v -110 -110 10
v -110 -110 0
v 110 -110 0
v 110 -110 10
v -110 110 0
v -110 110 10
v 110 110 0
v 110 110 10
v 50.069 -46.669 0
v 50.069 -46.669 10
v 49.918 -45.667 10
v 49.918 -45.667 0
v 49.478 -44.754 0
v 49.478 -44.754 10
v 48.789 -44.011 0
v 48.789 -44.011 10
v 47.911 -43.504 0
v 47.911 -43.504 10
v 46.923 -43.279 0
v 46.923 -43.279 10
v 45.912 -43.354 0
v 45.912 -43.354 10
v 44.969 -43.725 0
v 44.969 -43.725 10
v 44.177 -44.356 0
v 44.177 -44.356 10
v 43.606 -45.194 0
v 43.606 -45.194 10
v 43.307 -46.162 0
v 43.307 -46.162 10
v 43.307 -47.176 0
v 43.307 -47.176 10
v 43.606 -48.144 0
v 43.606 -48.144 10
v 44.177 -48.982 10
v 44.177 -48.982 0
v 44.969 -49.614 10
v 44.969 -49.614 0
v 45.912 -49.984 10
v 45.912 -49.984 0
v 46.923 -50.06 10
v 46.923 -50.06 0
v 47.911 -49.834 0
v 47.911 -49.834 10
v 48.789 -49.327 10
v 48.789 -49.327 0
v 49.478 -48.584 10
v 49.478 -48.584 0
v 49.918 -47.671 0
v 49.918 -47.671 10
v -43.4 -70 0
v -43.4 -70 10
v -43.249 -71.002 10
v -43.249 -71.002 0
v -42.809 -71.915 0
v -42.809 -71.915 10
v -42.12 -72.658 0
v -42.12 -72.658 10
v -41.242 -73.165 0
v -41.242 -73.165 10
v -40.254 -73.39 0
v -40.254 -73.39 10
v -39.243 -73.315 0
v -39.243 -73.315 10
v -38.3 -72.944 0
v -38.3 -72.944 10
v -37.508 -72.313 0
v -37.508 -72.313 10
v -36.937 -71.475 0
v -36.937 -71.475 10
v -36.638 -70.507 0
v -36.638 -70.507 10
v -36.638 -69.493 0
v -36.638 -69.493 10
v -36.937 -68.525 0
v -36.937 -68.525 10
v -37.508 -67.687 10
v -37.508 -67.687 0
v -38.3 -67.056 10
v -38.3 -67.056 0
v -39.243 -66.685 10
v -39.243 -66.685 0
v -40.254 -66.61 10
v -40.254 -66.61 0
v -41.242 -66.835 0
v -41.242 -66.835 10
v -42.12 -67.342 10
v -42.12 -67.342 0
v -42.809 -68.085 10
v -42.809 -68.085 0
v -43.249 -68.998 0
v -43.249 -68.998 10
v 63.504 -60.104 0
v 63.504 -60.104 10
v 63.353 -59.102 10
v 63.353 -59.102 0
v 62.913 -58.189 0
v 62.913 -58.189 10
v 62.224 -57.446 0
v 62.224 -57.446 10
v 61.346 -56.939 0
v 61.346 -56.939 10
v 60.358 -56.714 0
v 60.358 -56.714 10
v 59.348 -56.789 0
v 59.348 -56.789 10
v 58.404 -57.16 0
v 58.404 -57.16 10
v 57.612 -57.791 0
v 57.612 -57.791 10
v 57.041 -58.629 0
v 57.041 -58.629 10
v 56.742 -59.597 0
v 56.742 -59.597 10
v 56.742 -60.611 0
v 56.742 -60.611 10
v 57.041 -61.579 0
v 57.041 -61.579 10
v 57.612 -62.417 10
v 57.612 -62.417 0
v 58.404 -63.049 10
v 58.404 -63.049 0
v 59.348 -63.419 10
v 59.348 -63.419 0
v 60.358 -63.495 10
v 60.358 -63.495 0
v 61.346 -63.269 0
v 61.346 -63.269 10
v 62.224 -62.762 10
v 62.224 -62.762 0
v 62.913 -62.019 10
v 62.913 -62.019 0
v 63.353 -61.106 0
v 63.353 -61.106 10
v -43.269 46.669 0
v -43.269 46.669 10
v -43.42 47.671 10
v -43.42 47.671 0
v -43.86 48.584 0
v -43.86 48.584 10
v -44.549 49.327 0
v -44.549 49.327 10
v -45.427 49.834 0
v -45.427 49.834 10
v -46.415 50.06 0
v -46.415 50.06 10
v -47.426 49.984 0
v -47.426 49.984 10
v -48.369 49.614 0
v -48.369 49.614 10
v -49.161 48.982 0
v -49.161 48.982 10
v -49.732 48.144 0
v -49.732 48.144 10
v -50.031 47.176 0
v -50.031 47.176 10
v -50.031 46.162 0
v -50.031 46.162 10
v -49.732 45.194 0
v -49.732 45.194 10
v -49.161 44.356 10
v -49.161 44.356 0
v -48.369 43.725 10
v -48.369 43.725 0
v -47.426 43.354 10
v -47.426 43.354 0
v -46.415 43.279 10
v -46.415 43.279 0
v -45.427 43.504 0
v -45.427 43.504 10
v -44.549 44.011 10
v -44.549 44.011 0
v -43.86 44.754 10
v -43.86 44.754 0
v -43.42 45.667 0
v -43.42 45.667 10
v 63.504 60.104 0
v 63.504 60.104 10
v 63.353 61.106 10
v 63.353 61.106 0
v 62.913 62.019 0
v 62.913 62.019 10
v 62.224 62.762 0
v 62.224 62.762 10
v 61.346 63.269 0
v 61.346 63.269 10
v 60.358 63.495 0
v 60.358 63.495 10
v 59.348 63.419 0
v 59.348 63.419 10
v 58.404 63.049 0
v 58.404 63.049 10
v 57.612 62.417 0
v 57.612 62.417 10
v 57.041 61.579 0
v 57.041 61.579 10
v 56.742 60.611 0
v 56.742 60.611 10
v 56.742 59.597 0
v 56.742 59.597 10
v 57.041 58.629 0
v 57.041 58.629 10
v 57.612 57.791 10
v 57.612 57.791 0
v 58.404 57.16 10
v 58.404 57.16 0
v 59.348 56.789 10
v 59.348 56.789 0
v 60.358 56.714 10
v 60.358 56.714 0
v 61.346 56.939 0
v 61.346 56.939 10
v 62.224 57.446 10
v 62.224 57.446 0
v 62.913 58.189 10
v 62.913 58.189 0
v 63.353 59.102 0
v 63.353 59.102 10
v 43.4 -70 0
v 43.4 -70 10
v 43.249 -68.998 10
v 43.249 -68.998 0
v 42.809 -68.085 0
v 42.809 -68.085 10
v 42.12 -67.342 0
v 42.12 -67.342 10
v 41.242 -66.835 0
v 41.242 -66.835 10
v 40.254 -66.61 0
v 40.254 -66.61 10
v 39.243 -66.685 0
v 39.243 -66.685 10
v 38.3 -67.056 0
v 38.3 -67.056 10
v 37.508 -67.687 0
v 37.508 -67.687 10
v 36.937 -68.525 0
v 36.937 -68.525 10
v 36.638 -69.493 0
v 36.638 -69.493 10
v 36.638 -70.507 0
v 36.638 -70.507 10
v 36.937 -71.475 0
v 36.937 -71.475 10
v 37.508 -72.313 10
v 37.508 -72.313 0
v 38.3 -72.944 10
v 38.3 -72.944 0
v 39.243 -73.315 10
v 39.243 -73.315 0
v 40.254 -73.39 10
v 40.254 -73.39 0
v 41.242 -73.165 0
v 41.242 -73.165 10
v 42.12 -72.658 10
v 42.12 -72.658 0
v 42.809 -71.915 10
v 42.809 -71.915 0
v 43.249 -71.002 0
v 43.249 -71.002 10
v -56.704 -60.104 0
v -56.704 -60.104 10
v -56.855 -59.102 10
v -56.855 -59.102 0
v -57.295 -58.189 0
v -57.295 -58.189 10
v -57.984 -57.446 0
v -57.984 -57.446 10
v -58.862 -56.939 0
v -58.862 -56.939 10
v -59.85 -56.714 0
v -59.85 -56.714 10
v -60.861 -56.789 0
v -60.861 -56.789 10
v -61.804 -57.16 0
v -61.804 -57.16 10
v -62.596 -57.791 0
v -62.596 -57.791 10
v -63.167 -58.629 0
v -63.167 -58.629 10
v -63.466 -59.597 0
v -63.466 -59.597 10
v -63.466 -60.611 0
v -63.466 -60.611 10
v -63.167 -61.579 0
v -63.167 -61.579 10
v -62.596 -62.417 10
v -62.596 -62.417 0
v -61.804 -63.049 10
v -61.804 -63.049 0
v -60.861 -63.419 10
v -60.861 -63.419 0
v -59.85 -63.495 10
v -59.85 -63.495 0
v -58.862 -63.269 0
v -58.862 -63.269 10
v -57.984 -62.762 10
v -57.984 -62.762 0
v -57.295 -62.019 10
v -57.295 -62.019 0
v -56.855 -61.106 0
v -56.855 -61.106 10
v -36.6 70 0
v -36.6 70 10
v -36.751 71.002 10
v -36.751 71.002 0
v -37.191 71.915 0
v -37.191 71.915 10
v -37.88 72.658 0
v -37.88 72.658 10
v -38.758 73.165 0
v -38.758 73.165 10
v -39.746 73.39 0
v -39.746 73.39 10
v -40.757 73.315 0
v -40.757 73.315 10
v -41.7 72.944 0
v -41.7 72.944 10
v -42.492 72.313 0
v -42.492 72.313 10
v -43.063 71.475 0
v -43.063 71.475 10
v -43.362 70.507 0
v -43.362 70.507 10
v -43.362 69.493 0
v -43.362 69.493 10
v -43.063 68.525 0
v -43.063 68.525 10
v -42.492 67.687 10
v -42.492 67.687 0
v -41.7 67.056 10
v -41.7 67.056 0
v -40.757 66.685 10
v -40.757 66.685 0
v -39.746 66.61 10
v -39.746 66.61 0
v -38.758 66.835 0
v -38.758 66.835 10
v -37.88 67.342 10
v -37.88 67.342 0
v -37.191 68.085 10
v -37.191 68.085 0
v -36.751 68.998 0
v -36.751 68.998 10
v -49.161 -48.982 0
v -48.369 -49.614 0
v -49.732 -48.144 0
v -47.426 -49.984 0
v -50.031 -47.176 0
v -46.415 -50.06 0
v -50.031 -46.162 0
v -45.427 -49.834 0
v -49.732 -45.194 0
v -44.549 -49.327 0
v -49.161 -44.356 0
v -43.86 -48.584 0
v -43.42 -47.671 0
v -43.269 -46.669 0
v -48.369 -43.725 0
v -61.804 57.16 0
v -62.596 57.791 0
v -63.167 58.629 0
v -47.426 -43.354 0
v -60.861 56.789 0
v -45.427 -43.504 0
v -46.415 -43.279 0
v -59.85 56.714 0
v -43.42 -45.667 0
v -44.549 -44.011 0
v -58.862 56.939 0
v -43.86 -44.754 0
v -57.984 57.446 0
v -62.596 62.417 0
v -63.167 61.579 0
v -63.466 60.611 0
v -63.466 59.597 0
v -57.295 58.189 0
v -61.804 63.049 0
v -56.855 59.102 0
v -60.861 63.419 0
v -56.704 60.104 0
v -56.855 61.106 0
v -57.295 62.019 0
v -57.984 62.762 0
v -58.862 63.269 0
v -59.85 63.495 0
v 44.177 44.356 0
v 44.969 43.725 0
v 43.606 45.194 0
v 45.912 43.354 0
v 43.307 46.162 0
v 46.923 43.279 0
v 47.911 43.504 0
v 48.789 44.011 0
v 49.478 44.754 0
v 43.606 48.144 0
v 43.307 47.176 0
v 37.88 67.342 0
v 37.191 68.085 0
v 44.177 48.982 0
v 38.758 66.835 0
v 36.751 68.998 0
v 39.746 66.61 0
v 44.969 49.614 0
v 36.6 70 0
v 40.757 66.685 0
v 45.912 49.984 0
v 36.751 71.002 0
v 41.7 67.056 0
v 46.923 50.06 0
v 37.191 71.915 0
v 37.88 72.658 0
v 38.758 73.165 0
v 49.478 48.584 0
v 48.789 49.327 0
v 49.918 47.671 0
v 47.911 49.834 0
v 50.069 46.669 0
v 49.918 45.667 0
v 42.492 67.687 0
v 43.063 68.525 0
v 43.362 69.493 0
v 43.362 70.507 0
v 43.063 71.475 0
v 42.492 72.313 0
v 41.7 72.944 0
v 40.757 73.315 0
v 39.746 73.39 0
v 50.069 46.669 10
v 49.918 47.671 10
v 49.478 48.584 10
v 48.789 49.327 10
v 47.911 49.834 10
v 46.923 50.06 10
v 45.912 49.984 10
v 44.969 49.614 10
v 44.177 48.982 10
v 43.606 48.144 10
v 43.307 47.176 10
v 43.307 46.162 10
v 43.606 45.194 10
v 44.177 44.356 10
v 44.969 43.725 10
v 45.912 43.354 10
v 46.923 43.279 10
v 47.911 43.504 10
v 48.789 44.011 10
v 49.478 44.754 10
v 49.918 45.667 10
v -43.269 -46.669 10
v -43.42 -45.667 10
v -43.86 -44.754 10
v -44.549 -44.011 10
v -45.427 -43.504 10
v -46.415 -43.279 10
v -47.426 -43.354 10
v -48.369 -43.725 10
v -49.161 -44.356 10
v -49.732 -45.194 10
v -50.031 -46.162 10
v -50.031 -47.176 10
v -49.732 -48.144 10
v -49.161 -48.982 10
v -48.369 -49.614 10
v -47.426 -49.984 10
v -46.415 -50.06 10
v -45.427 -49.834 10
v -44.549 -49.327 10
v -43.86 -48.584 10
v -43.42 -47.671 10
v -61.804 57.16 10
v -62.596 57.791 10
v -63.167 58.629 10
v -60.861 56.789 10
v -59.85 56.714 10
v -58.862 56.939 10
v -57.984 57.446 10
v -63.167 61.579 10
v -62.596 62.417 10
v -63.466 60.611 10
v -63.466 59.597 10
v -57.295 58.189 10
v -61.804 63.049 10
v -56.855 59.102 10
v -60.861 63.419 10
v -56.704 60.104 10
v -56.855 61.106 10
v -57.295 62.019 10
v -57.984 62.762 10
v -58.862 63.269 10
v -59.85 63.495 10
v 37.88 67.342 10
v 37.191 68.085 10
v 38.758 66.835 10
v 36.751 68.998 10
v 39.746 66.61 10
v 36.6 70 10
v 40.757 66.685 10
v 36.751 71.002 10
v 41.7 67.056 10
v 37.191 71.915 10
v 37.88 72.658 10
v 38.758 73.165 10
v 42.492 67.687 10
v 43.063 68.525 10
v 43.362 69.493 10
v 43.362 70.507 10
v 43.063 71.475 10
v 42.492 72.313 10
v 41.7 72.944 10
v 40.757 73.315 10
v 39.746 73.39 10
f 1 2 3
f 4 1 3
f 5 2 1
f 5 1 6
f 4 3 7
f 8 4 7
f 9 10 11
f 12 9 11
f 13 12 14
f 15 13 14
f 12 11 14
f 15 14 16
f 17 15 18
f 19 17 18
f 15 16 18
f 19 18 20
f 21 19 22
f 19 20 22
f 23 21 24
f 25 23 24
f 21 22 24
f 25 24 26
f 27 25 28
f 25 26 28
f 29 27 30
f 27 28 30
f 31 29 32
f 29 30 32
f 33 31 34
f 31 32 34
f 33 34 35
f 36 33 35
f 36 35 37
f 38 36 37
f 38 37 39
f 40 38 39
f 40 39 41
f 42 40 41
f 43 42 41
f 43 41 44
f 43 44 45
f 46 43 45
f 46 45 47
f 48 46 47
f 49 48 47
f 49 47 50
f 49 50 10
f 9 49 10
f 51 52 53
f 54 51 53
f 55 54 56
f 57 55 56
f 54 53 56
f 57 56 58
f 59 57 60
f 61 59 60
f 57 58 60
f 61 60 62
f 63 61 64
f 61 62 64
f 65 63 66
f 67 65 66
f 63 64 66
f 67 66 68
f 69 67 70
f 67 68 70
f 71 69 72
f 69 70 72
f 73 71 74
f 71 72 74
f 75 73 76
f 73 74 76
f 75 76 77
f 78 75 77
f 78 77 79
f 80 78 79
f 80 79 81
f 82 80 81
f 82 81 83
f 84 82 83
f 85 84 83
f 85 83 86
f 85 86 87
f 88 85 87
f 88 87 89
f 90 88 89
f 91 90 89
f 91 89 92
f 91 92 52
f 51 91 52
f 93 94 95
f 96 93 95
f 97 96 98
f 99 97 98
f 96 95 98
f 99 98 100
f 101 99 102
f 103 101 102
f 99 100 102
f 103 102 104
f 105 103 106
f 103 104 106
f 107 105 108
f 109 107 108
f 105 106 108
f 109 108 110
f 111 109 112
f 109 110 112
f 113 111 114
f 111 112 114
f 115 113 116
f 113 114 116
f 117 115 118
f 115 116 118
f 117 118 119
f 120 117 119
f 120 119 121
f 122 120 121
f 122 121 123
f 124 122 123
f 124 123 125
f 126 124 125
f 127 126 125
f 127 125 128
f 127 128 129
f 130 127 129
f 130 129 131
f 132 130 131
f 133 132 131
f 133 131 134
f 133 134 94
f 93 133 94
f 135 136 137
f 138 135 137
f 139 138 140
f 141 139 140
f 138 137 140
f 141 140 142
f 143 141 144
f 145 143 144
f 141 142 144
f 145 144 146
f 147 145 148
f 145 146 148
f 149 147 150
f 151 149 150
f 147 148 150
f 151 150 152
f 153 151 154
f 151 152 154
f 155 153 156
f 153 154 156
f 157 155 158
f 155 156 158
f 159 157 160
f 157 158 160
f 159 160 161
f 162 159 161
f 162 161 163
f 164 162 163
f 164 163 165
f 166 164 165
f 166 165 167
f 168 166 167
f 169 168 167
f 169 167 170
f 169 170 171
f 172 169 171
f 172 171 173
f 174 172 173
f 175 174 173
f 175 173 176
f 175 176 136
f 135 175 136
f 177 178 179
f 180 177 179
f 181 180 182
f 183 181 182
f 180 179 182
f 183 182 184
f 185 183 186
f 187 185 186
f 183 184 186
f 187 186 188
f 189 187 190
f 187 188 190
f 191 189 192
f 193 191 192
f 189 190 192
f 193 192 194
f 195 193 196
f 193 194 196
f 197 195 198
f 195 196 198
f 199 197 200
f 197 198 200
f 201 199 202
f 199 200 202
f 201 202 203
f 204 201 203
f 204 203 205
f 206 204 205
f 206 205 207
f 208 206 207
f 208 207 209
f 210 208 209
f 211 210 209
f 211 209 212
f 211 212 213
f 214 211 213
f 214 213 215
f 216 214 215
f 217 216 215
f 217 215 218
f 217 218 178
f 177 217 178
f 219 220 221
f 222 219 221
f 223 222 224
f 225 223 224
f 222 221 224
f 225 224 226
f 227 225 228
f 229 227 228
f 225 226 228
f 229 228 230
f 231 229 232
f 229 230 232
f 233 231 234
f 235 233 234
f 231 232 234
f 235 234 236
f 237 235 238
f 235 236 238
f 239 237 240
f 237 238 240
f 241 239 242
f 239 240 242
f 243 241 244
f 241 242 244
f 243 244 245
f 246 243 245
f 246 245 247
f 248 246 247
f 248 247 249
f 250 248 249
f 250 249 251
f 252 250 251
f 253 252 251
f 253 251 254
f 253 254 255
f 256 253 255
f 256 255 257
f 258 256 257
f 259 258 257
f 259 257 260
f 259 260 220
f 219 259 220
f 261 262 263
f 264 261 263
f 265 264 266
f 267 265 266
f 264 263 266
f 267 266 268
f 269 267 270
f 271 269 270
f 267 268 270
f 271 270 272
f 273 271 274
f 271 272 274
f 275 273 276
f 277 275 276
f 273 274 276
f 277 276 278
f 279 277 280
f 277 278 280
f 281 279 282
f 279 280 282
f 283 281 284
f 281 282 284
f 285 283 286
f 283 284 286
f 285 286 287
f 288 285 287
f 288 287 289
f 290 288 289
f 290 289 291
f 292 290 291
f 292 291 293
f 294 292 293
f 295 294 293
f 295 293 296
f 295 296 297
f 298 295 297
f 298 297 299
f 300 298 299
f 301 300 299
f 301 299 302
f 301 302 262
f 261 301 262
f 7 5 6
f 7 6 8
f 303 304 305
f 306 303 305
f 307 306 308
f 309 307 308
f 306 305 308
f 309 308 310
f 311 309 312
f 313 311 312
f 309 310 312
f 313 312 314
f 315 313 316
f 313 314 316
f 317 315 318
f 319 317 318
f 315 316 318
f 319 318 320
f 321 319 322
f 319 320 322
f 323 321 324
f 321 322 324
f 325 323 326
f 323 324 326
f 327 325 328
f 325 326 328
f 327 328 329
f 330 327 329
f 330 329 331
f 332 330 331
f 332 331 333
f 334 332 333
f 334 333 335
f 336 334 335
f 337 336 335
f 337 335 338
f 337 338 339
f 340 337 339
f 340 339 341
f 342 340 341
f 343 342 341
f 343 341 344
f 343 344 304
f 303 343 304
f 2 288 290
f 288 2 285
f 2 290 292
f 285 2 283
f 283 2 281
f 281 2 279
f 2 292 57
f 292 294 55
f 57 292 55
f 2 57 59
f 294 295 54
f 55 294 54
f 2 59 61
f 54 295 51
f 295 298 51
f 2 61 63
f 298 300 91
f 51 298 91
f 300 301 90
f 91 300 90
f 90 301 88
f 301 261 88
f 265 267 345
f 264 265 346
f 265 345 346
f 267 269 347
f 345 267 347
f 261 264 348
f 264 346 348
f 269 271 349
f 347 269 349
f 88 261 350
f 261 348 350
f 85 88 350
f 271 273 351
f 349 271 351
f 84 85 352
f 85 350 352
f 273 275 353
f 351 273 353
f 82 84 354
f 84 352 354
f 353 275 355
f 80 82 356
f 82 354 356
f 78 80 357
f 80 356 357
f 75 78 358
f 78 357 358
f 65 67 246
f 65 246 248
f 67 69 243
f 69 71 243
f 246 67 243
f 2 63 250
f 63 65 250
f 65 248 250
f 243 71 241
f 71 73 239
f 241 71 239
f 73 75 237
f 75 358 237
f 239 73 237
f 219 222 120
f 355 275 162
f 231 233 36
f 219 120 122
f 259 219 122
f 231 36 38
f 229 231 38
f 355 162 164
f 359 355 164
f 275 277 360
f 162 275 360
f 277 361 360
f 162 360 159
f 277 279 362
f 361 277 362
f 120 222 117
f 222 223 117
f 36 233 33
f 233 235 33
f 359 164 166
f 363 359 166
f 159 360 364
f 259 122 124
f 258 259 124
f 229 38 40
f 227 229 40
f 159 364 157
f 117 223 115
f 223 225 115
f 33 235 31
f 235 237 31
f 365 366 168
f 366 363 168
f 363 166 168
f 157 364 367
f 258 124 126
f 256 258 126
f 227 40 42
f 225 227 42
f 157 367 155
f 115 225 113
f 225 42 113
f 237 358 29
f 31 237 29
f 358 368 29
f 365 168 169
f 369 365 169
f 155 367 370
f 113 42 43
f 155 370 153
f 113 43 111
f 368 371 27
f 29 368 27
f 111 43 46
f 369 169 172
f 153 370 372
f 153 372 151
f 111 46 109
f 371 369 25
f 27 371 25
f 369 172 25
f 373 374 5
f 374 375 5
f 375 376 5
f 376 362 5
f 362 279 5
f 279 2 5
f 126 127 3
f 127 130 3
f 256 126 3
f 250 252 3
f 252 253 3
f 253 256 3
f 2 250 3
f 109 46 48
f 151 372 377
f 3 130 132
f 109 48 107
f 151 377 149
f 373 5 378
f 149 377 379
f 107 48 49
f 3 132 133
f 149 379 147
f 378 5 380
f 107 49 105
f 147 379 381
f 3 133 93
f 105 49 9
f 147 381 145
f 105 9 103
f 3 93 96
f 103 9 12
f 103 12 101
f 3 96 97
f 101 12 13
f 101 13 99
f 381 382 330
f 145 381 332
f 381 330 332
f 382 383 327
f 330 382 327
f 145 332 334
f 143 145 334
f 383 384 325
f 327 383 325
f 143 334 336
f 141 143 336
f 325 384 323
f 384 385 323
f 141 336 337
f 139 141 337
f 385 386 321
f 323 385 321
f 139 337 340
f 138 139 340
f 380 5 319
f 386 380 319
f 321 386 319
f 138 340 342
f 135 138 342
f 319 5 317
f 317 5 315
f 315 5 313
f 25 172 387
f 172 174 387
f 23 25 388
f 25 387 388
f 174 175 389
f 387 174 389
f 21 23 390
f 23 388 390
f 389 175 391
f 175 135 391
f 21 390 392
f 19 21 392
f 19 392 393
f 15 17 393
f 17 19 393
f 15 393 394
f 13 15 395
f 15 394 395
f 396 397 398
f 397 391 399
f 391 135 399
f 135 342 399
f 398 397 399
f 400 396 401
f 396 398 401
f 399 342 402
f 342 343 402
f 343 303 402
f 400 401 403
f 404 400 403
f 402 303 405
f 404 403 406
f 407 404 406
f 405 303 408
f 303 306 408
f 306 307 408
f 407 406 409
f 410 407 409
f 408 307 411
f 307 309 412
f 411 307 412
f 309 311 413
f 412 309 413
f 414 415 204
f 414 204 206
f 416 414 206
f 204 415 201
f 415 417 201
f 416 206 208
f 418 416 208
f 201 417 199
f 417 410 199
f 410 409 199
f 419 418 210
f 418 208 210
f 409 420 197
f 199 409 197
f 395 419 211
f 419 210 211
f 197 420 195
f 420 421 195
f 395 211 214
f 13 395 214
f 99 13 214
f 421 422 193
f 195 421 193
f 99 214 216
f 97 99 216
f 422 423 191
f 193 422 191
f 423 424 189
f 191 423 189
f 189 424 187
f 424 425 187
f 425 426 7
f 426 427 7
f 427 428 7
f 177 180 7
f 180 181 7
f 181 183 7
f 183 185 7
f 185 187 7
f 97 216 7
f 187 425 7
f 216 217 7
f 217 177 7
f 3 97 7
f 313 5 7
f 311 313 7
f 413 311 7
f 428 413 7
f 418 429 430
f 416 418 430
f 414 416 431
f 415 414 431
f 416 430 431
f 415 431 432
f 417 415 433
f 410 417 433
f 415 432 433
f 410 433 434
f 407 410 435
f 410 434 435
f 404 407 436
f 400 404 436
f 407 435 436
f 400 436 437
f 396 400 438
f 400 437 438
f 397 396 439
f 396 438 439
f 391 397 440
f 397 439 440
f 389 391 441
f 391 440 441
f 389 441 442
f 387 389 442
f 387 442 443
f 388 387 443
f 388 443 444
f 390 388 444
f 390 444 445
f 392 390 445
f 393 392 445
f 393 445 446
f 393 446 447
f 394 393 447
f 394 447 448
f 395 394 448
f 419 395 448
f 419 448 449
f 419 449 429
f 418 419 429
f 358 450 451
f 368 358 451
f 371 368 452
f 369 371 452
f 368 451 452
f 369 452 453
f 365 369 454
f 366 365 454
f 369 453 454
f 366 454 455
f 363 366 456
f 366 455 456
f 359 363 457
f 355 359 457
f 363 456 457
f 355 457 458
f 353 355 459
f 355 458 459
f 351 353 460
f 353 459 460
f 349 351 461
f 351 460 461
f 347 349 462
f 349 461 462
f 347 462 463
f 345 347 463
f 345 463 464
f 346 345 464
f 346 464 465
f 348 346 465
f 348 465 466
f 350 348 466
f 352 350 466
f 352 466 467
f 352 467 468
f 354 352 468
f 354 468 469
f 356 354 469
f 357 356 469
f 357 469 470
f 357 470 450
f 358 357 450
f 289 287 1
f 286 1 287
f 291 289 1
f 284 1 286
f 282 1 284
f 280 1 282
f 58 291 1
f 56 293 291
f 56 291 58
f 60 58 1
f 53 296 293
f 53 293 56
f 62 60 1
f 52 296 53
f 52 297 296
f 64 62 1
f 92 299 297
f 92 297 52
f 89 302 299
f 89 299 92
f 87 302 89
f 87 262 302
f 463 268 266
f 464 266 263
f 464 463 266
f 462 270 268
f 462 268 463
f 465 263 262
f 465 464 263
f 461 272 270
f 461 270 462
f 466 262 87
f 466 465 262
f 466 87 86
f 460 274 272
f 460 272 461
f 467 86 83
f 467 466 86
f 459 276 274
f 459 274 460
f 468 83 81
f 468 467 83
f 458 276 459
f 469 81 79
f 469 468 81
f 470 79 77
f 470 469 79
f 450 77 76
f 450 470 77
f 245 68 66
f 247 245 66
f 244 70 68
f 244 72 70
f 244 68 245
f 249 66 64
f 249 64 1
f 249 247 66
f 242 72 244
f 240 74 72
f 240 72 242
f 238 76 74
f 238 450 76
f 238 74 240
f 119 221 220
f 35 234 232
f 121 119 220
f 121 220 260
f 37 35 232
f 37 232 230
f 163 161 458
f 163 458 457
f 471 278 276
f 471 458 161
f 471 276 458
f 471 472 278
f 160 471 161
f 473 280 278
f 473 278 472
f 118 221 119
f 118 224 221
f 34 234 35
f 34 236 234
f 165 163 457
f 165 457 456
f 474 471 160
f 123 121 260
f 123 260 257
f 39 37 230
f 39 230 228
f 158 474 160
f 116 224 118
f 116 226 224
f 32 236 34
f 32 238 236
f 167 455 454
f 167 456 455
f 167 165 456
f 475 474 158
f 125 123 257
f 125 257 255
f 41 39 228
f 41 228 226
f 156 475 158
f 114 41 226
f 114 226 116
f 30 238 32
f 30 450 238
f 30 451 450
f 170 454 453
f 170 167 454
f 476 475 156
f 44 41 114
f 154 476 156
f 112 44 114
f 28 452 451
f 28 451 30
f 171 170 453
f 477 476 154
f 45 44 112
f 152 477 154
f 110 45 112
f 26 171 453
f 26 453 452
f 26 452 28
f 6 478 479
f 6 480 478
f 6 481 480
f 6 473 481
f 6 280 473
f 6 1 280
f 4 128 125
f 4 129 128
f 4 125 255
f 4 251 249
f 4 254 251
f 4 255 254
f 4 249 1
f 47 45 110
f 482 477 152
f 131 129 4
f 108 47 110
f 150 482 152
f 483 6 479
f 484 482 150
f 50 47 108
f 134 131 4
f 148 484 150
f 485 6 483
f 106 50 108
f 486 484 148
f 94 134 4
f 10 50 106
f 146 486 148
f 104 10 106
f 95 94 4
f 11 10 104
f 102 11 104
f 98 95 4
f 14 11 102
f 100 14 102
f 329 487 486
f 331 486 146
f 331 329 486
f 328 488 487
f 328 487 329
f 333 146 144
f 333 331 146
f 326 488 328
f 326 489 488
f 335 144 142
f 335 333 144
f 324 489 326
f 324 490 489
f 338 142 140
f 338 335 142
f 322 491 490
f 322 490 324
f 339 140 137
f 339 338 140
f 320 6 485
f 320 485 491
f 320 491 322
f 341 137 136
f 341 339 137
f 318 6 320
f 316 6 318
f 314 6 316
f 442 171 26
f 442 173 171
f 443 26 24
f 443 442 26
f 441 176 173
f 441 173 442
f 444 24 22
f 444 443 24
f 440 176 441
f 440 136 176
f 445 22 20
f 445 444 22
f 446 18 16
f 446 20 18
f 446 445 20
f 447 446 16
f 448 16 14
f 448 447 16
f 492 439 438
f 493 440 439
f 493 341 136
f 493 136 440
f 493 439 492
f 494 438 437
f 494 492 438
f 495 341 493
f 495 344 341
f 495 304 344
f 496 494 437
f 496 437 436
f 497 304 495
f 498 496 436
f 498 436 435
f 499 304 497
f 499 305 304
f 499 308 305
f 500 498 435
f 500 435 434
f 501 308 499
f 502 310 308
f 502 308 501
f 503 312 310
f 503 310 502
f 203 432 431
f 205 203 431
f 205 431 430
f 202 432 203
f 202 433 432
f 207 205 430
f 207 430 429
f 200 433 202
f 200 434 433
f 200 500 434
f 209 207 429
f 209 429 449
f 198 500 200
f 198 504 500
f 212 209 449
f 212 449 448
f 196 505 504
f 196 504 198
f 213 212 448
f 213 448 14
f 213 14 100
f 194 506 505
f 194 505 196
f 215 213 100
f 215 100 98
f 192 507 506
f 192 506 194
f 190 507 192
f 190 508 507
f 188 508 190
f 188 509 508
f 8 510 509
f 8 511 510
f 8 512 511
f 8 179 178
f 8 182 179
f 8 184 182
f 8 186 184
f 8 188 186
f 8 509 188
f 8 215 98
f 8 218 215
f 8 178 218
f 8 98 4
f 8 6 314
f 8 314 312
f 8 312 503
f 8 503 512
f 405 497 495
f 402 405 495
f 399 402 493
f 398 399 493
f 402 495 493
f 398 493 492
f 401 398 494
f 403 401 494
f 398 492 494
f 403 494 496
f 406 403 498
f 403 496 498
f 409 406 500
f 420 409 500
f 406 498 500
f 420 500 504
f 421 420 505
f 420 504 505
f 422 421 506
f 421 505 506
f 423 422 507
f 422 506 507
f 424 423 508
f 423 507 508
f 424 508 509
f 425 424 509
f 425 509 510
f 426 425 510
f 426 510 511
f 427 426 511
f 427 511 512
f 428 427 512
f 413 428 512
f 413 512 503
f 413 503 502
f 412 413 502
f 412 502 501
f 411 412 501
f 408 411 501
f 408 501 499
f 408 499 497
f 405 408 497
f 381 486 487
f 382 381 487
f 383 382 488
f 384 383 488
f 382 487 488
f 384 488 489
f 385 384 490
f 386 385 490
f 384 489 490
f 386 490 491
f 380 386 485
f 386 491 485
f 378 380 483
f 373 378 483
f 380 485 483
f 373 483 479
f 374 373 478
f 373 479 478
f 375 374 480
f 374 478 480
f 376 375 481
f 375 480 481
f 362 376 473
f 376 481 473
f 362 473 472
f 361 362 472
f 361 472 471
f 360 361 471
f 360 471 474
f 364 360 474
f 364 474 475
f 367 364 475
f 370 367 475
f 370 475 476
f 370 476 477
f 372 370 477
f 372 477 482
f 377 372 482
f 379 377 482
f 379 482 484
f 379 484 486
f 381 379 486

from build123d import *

# Parameters (mm, degrees)
SKIZZE1_W                       = 220
SKIZZE1_H                       = 220
AUFSATZ_LINEAR_AUSTRAGEN1_DEPTH = 10
SKIZZE2_R                       = 3.4
SCHNITT_LINEAR_AUSTRAGEN1_DEPTH = 156.884572681
SKIZZE3_R                       = 3.4
SCHNITT_LINEAR_AUSTRAGEN2_DEPTH = 156.884572681


with BuildPart() as part:
    # Skizze1 → Aufsatz-Linear austragen1 (new body)
    with BuildSketch(Plane.XY):
        Rectangle(SKIZZE1_W, SKIZZE1_H)
    extrude(amount=AUFSATZ_LINEAR_AUSTRAGEN1_DEPTH)

    # Skizze2 → Schnitt-Linear austragen1 (cut, through all)
    with BuildSketch(Plane.XY.offset(10)):
        with Locations((46.669047558, 46.669047558)):
            Circle(SKIZZE2_R)
        with Locations((46.669047558, -46.669047558)):
            Circle(SKIZZE2_R)
        with Locations((-46.669047558, -46.669047558)):
            Circle(SKIZZE2_R)
        with Locations((-46.669047558, 46.669047558)):
            Circle(SKIZZE2_R)
        with Locations((60.104076401, 60.104076401)):
            Circle(SKIZZE2_R)
        with Locations((60.104076401, -60.104076401)):
            Circle(SKIZZE2_R)
        with Locations((-60.104076401, -60.104076401)):
            Circle(SKIZZE2_R)
        with Locations((-60.104076401, 60.104076401)):
            Circle(SKIZZE2_R)
    extrude(amount=-SCHNITT_LINEAR_AUSTRAGEN1_DEPTH, mode=Mode.SUBTRACT)

    # Skizze3 → Schnitt-Linear austragen2 (cut, through all)
    with BuildSketch(Plane.XY.offset(10)):
        with Locations((40, -70)):
            Circle(SKIZZE3_R)
        with Locations((-40, -70)):
            Circle(SKIZZE3_R)
        with Locations((40, 70)):
            Circle(SKIZZE3_R)
        with Locations((-40, 70)):
            Circle(SKIZZE3_R)
    extrude(amount=-SCHNITT_LINEAR_AUSTRAGEN2_DEPTH, mode=Mode.SUBTRACT)


solid = part.part
